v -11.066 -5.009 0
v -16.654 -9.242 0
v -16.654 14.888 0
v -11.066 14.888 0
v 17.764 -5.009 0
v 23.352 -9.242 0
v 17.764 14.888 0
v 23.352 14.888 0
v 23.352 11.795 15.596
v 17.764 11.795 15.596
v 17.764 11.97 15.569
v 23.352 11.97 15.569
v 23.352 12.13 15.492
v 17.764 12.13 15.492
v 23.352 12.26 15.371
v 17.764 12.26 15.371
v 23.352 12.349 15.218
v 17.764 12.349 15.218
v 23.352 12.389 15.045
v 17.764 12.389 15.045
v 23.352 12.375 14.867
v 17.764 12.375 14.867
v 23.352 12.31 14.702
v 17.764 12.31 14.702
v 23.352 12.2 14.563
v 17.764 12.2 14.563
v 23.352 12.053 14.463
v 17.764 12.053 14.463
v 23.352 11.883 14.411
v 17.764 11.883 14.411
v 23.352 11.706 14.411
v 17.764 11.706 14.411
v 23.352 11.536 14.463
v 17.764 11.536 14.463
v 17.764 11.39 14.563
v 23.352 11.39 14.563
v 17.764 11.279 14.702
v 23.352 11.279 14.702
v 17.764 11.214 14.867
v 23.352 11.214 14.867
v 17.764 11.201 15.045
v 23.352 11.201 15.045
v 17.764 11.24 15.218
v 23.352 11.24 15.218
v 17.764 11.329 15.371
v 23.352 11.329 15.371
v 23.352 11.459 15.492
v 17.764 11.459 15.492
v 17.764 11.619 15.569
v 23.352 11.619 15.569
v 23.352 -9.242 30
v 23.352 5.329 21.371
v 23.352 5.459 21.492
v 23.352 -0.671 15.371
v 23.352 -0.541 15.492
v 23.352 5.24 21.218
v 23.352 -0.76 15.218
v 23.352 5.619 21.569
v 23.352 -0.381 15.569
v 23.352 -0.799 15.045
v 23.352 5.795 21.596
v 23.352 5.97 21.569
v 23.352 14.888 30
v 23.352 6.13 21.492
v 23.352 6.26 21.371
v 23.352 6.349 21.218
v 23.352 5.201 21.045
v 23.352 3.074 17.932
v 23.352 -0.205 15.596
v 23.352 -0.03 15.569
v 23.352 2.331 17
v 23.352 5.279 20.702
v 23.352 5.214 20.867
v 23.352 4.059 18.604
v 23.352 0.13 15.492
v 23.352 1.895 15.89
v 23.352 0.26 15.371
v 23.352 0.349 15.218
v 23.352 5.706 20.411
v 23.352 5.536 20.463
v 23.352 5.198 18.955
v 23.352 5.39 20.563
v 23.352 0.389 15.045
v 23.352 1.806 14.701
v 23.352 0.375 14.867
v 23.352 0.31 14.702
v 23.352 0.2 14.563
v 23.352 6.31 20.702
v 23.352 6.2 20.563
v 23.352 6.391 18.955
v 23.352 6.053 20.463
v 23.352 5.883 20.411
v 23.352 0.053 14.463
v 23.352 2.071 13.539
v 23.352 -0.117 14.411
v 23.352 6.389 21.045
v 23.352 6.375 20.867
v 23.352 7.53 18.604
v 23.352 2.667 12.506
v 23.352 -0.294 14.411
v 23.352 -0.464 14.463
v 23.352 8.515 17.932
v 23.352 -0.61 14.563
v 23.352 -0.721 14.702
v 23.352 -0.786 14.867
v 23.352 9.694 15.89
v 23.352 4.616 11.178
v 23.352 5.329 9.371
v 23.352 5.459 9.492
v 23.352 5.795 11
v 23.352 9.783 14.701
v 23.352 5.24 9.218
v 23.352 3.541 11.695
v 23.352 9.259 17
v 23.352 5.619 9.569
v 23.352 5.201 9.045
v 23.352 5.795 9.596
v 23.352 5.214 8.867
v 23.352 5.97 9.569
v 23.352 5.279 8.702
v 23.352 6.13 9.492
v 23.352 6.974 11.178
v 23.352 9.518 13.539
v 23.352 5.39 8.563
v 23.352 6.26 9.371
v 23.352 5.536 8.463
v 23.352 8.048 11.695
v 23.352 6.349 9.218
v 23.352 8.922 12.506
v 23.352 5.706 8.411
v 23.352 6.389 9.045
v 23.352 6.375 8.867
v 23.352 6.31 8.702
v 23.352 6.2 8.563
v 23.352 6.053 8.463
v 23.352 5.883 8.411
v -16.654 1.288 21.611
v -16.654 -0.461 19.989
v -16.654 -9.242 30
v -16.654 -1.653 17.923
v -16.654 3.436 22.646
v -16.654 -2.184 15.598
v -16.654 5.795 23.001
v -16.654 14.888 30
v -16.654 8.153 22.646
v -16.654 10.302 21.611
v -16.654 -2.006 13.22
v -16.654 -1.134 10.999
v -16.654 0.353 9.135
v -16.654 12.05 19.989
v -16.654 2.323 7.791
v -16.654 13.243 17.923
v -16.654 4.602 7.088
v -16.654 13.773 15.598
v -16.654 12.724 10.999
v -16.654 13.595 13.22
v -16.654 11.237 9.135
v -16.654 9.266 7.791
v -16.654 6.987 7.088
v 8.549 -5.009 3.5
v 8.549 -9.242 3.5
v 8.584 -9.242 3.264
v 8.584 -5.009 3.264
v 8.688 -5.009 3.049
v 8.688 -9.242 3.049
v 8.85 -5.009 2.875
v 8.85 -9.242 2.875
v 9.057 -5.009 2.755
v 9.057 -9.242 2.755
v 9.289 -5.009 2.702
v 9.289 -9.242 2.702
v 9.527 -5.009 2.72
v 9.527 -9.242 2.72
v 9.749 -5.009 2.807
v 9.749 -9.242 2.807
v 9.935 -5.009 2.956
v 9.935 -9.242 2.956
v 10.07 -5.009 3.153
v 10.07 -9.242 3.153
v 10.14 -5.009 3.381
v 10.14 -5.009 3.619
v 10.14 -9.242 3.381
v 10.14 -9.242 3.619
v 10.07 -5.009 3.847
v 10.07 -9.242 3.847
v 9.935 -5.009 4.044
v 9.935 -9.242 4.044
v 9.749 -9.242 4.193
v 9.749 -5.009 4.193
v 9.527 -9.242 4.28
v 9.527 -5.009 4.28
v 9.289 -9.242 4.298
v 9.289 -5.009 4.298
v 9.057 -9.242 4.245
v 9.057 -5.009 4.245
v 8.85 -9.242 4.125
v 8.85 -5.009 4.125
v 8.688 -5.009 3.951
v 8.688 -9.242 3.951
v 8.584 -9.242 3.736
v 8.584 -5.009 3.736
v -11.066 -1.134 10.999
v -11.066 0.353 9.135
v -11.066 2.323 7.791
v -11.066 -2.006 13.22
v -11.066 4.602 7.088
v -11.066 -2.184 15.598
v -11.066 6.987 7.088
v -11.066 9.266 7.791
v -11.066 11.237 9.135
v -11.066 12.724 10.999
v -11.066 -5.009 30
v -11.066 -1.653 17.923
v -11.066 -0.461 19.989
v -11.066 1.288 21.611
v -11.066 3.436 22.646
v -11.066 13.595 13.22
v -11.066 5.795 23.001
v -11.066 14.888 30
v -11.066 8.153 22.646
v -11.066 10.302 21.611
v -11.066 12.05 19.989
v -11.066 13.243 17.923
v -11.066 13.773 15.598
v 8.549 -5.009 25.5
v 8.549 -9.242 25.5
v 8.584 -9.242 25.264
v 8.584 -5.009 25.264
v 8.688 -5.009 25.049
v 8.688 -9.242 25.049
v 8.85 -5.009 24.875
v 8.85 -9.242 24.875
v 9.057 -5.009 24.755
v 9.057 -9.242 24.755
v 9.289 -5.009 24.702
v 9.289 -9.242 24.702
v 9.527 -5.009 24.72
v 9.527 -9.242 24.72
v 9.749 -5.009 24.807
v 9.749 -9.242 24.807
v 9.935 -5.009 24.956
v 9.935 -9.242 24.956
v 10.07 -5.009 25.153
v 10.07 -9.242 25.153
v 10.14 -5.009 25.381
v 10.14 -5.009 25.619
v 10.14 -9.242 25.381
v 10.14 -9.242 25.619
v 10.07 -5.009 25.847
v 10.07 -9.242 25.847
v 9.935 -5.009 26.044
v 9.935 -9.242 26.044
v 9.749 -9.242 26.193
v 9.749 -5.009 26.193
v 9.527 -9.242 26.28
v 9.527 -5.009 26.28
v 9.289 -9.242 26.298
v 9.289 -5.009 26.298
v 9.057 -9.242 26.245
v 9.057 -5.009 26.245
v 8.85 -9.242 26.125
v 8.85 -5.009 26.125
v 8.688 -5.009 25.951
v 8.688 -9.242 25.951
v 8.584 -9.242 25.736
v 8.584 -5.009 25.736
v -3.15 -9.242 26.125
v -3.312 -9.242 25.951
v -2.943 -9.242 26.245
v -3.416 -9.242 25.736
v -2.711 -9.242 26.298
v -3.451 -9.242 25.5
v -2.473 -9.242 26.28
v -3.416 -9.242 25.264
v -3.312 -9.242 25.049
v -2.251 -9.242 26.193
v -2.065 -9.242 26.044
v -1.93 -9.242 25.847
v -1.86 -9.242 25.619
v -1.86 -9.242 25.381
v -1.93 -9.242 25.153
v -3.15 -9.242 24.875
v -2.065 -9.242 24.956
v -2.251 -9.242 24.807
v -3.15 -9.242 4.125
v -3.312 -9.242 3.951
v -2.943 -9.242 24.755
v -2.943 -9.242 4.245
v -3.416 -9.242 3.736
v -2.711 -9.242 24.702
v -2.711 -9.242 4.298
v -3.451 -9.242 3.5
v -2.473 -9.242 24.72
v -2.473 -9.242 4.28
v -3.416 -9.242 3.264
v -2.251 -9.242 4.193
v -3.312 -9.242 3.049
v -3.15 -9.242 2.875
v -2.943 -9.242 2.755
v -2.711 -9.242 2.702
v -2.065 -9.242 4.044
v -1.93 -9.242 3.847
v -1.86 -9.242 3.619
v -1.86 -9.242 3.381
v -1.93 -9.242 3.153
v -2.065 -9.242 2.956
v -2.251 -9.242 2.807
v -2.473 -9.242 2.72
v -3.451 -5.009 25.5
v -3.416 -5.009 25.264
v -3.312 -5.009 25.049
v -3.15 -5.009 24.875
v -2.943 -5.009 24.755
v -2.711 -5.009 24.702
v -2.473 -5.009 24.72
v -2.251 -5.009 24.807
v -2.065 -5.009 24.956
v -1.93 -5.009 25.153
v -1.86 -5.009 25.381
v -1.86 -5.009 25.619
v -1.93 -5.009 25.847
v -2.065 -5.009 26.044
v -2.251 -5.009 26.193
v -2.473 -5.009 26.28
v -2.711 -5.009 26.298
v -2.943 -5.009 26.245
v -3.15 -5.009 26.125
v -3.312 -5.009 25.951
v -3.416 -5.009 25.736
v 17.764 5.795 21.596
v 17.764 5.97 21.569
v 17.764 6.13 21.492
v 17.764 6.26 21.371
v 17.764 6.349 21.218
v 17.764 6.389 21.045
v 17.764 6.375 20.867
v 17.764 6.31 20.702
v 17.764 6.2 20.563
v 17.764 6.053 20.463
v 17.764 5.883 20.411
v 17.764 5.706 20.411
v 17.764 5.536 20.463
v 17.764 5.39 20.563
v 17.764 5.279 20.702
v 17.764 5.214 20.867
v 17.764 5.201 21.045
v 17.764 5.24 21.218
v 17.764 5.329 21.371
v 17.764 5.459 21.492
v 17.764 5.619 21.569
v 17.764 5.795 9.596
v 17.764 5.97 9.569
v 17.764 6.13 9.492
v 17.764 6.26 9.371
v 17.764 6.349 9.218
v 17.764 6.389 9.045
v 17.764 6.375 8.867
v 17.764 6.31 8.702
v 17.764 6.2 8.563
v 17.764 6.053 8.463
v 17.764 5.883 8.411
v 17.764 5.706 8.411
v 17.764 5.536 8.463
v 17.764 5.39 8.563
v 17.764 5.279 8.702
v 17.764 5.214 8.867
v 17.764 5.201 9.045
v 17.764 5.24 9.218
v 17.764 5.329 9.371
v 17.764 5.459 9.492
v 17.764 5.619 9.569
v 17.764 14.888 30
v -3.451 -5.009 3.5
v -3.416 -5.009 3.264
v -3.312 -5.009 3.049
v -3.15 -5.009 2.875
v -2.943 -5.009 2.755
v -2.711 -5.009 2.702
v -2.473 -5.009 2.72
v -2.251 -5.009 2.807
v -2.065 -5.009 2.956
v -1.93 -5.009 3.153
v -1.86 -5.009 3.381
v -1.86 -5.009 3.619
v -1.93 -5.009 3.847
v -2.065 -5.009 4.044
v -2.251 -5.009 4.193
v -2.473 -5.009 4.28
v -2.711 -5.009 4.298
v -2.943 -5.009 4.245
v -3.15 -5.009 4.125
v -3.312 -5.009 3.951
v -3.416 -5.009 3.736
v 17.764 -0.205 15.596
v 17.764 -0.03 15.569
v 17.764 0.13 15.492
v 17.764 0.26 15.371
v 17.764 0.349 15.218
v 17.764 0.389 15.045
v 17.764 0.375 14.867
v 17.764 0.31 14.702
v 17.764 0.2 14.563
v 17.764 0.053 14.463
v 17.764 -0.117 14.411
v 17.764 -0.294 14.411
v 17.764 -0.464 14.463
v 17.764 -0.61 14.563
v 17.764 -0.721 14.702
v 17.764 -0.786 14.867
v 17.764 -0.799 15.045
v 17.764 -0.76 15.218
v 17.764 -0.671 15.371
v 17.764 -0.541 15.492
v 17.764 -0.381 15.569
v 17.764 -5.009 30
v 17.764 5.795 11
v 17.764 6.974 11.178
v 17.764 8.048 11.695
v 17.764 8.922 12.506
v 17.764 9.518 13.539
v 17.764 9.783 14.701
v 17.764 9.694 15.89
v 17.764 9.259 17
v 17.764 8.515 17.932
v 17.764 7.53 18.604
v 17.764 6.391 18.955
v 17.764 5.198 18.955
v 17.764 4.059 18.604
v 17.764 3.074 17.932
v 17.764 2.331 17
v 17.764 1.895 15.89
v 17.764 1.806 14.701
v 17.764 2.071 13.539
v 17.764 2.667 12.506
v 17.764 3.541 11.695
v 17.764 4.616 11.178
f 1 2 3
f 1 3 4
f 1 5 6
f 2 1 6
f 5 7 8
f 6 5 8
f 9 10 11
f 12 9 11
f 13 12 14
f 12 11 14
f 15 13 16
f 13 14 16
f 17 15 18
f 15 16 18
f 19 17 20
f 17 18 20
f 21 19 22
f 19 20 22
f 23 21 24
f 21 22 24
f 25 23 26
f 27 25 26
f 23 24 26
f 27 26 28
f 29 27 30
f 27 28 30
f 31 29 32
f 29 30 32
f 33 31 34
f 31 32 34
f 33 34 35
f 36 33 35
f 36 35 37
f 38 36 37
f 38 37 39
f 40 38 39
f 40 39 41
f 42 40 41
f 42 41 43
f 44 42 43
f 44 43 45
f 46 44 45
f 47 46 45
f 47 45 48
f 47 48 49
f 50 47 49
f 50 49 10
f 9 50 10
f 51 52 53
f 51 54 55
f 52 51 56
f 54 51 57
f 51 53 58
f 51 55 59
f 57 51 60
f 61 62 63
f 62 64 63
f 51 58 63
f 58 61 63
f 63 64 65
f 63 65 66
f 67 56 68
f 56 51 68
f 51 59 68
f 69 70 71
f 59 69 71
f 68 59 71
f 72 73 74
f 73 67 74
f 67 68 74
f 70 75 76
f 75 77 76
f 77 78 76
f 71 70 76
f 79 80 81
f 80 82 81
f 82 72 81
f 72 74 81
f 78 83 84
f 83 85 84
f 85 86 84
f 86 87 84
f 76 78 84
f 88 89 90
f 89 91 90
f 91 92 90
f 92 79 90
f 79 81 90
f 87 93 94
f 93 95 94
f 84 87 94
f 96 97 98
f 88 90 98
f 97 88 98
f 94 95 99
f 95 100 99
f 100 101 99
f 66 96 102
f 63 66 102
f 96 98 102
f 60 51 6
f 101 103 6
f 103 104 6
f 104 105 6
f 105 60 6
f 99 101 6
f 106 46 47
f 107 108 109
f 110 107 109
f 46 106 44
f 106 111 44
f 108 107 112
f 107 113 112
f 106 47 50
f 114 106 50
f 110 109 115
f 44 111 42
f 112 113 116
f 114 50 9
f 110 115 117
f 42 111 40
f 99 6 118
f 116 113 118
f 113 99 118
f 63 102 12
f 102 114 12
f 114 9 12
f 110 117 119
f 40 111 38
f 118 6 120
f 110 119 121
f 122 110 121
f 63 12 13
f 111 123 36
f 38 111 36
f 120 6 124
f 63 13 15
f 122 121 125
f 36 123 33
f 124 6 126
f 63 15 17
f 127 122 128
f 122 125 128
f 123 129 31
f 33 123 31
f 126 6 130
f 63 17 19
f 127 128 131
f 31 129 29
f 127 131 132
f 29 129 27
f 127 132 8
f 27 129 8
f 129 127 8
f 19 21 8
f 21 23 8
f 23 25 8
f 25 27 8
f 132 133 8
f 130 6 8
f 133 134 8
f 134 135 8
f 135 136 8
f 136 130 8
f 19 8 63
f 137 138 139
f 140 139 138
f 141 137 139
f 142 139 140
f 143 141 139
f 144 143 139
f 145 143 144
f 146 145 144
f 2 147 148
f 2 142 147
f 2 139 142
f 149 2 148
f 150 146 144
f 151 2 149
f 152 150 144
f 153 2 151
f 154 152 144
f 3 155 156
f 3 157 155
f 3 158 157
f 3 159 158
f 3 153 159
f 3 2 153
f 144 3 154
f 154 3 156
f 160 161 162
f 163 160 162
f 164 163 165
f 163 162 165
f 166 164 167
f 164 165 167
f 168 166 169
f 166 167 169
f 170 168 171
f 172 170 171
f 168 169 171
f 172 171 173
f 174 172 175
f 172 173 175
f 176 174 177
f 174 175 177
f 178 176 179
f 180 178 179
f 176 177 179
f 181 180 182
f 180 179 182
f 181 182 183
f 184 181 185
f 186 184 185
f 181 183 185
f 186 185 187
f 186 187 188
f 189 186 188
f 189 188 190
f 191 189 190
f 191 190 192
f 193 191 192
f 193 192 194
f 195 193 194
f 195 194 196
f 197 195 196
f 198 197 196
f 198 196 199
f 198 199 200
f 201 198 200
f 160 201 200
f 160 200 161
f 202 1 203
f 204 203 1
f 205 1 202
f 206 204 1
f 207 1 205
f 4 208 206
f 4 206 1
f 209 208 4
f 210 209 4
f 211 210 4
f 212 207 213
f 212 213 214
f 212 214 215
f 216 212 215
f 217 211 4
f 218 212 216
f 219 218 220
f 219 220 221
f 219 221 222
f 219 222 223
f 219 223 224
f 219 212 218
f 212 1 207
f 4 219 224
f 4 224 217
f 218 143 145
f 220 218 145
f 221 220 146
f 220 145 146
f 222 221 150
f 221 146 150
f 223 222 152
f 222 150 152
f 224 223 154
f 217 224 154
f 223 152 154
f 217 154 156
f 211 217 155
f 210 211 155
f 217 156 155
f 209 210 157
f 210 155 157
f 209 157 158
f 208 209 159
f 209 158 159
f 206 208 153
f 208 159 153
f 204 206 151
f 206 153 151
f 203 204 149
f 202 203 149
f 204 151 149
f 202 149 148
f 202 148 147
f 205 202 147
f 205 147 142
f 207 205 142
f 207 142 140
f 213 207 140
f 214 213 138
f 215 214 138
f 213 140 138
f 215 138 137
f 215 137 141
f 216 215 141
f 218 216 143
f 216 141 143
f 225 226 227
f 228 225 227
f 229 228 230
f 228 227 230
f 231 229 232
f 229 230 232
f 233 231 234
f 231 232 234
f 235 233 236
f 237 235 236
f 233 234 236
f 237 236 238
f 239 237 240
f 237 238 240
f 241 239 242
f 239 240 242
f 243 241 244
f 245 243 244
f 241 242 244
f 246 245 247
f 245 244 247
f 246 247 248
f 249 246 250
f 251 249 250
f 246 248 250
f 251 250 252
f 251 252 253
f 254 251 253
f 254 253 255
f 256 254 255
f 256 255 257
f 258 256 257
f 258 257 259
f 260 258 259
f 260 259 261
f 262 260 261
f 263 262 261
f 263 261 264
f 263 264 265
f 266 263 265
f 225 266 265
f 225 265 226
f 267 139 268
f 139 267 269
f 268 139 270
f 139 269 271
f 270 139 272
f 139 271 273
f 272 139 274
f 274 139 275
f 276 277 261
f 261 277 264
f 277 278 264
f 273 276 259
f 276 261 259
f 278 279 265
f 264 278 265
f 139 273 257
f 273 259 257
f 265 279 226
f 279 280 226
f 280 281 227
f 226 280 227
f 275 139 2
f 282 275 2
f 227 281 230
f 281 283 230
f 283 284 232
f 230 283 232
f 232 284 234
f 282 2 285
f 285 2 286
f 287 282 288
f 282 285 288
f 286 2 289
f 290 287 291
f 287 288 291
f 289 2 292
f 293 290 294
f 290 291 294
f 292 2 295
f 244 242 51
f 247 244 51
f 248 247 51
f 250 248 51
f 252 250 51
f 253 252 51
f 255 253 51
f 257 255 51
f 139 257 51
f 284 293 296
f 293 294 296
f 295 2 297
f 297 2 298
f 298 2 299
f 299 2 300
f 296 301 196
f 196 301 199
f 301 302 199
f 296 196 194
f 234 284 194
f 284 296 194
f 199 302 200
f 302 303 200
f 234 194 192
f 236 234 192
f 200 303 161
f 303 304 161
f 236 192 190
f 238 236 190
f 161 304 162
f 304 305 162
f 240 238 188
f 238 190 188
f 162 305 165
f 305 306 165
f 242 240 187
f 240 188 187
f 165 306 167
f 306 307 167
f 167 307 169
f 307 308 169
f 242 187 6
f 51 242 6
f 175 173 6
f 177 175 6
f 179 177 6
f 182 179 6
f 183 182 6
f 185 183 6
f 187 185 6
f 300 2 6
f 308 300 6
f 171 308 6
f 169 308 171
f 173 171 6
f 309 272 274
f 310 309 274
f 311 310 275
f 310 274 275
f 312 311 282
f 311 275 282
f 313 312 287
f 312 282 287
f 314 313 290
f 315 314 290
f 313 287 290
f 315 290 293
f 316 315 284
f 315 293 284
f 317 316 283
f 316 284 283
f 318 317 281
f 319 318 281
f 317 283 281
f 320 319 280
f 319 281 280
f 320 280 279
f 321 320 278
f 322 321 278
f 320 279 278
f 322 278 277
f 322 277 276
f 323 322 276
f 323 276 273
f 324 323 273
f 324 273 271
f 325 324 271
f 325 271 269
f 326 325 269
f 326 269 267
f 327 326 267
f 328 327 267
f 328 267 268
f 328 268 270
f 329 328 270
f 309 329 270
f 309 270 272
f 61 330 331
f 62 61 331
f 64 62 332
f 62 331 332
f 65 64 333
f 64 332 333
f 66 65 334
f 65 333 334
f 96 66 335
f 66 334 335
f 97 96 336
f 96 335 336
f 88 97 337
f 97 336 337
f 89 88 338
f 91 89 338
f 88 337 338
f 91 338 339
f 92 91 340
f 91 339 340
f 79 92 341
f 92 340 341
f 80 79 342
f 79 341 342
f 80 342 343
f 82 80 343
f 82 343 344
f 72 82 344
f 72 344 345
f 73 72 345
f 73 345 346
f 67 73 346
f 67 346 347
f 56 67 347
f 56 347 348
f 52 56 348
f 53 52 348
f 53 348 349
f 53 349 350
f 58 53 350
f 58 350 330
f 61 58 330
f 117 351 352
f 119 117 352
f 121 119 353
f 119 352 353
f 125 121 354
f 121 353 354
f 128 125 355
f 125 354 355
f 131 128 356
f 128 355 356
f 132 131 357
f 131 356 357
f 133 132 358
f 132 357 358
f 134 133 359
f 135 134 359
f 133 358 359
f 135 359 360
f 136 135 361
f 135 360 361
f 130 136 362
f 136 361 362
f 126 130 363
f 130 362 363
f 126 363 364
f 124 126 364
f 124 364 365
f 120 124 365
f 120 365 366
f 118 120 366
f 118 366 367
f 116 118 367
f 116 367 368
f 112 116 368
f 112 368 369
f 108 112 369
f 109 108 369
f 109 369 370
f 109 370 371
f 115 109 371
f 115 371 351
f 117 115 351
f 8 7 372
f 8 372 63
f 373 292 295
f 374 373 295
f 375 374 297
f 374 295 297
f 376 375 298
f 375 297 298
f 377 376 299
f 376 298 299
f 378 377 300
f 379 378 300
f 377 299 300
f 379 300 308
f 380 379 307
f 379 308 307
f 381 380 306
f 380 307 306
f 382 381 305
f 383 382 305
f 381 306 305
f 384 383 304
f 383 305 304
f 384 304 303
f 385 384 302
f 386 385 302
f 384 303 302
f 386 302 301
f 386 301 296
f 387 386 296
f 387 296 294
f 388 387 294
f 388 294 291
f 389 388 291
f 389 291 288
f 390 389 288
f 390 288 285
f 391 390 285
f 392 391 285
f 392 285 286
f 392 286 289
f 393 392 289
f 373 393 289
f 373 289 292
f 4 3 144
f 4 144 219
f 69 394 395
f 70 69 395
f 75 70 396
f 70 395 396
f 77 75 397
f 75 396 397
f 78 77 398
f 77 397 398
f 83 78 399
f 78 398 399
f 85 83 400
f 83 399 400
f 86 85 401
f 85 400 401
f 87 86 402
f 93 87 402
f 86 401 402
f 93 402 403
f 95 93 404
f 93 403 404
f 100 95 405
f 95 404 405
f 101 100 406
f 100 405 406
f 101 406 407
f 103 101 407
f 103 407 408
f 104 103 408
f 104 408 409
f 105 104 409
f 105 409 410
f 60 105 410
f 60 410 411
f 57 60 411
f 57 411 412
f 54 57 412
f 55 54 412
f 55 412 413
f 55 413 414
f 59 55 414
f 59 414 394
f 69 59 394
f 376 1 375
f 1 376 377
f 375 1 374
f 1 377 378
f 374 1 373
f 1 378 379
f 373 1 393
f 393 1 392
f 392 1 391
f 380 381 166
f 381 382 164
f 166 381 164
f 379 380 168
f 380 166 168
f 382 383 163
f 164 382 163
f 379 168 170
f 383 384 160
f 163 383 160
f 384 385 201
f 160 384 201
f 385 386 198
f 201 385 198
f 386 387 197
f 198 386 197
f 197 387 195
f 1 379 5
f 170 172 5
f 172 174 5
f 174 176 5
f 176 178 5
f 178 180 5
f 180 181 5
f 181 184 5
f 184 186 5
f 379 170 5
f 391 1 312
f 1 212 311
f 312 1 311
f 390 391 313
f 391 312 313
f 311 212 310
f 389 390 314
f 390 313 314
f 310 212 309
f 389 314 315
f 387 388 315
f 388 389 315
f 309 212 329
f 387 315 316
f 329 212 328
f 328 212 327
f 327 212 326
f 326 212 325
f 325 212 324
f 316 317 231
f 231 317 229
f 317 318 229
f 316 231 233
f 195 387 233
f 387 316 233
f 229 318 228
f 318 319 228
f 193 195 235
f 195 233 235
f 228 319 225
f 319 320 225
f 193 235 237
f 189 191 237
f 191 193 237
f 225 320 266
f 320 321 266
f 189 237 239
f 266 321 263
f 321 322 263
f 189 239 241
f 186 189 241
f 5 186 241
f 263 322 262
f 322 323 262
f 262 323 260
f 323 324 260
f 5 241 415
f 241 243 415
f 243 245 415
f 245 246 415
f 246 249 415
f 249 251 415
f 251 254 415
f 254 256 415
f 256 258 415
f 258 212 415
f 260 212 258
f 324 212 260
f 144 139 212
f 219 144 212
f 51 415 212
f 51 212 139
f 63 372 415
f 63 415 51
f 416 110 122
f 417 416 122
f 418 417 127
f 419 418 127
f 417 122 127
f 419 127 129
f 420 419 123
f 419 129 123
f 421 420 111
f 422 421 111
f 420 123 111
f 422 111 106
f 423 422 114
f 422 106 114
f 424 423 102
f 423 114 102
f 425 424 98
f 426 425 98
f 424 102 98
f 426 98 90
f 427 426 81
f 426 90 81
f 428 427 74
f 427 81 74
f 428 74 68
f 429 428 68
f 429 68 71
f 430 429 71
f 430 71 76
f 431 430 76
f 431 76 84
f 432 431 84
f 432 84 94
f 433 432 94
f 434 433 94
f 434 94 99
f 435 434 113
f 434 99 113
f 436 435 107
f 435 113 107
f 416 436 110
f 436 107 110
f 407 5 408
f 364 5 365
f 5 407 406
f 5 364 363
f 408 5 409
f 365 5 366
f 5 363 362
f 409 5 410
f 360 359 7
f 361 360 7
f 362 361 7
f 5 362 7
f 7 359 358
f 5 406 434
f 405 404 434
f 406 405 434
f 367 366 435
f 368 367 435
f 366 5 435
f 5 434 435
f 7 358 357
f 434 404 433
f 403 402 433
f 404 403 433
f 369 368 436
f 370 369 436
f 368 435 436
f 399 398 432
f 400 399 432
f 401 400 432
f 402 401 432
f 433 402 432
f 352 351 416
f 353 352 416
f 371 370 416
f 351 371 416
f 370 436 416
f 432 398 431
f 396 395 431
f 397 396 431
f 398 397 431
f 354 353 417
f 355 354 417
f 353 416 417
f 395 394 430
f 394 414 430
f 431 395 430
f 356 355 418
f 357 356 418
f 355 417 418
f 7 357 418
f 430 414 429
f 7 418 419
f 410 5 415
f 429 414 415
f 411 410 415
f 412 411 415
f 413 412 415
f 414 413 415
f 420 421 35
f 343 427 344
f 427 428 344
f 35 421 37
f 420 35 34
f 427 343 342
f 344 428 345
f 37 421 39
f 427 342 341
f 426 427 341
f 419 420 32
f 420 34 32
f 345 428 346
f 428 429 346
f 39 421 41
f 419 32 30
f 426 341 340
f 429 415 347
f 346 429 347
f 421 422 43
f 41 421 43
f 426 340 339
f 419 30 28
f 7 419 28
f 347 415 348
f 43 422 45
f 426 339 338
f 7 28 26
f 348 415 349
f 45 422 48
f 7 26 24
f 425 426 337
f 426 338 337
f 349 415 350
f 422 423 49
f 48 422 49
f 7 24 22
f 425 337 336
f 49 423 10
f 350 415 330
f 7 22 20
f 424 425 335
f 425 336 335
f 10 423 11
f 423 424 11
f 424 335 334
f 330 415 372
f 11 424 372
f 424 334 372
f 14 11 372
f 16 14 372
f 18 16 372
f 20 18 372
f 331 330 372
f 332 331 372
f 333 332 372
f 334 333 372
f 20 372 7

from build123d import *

# Parameters (mm, degrees)
SKETCH1_W                 = 40.0059906
SKETCH1_H                 = 24.13
BOSS_EXTRUDE1_DEPTH       = 30
SKETCH6_W                 = 28.8299906
SKETCH6_H                 = 19.896666666
CUT_EXTRUDE1_DEPTH        = 30
SKETCH9_R                 = 0.8
CUT_EXTRUDE3_DEPTH        = 30
SKETCH29_R                = 8.001
CUT_EXTRUDE4_DEPTH        = 5.588
SKETCH41_R                = 4
CUT_EXTRUDE5_DEPTH        = 5.588
F_0_80_TAPPED_HOLE1_D     = 1.19126
F_0_80_TAPPED_HOLE1_DEPTH = 5.588


with BuildPart() as part:
    # Sketch1 → Boss-Extrude1 (new body)
    with BuildSketch(Plane.XY):
        with Locations((3.348789693, 2.822850467)):
            Rectangle(SKETCH1_W, SKETCH1_H)
    extrude(amount=BOSS_EXTRUDE1_DEPTH)

    # Sketch6 → Cut-Extrude1 (cut)
    with BuildSketch(Plane.XY.offset(30)):
        with Locations((3.348789693, 4.939517134)):
            Rectangle(SKETCH6_W, SKETCH6_H)
    extrude(amount=-CUT_EXTRUDE1_DEPTH, mode=Mode.SUBTRACT)

    # Sketch9 → Cut-Extrude3 (cut)
    with BuildSketch(Plane(origin=(0, -9.242149533, 0), x_dir=(-1, 0, 0), z_dir=(0, -1, 0))):
        with Locations((2.651210307, -25.5)):
            Circle(SKETCH9_R)
        with Locations((-9.348789693, -25.5)):
            Circle(SKETCH9_R)
        with Locations((-9.348789693, -3.5)):
            Circle(SKETCH9_R)
        with Locations((2.651210307, -3.5)):
            Circle(SKETCH9_R)
    extrude(amount=-CUT_EXTRUDE3_DEPTH, mode=Mode.SUBTRACT)

    # Sketch29 → Cut-Extrude4 (cut)
    with BuildSketch(Plane.ZY.offset(16.654205607)):
        with Locations((15, 5.794650467)):
            Circle(SKETCH29_R)
    extrude(amount=-CUT_EXTRUDE4_DEPTH, mode=Mode.SUBTRACT)

    # Sketch41 → Cut-Extrude5 (cut)
    with BuildSketch(Plane(origin=(23.351784993, 0, 0), x_dir=(0, 0, -1), z_dir=(1, 0, 0))):
        with Locations((-15, 5.794650467)):
            Circle(SKETCH41_R)
    extrude(amount=-CUT_EXTRUDE5_DEPTH, mode=Mode.SUBTRACT)

    # #0-80 Tapped Hole1
    with Locations(Plane(origin=(23.351784993, 0, 0), x_dir=(0, 0, -1), z_dir=(1, 0, 0))):
        with Locations((-15, 11.794650467), (-9, 5.794650467), (-15, -0.205349533), (-21, 5.794650467)):
            Hole(F_0_80_TAPPED_HOLE1_D / 2, depth=F_0_80_TAPPED_HOLE1_DEPTH)


solid = part.part
